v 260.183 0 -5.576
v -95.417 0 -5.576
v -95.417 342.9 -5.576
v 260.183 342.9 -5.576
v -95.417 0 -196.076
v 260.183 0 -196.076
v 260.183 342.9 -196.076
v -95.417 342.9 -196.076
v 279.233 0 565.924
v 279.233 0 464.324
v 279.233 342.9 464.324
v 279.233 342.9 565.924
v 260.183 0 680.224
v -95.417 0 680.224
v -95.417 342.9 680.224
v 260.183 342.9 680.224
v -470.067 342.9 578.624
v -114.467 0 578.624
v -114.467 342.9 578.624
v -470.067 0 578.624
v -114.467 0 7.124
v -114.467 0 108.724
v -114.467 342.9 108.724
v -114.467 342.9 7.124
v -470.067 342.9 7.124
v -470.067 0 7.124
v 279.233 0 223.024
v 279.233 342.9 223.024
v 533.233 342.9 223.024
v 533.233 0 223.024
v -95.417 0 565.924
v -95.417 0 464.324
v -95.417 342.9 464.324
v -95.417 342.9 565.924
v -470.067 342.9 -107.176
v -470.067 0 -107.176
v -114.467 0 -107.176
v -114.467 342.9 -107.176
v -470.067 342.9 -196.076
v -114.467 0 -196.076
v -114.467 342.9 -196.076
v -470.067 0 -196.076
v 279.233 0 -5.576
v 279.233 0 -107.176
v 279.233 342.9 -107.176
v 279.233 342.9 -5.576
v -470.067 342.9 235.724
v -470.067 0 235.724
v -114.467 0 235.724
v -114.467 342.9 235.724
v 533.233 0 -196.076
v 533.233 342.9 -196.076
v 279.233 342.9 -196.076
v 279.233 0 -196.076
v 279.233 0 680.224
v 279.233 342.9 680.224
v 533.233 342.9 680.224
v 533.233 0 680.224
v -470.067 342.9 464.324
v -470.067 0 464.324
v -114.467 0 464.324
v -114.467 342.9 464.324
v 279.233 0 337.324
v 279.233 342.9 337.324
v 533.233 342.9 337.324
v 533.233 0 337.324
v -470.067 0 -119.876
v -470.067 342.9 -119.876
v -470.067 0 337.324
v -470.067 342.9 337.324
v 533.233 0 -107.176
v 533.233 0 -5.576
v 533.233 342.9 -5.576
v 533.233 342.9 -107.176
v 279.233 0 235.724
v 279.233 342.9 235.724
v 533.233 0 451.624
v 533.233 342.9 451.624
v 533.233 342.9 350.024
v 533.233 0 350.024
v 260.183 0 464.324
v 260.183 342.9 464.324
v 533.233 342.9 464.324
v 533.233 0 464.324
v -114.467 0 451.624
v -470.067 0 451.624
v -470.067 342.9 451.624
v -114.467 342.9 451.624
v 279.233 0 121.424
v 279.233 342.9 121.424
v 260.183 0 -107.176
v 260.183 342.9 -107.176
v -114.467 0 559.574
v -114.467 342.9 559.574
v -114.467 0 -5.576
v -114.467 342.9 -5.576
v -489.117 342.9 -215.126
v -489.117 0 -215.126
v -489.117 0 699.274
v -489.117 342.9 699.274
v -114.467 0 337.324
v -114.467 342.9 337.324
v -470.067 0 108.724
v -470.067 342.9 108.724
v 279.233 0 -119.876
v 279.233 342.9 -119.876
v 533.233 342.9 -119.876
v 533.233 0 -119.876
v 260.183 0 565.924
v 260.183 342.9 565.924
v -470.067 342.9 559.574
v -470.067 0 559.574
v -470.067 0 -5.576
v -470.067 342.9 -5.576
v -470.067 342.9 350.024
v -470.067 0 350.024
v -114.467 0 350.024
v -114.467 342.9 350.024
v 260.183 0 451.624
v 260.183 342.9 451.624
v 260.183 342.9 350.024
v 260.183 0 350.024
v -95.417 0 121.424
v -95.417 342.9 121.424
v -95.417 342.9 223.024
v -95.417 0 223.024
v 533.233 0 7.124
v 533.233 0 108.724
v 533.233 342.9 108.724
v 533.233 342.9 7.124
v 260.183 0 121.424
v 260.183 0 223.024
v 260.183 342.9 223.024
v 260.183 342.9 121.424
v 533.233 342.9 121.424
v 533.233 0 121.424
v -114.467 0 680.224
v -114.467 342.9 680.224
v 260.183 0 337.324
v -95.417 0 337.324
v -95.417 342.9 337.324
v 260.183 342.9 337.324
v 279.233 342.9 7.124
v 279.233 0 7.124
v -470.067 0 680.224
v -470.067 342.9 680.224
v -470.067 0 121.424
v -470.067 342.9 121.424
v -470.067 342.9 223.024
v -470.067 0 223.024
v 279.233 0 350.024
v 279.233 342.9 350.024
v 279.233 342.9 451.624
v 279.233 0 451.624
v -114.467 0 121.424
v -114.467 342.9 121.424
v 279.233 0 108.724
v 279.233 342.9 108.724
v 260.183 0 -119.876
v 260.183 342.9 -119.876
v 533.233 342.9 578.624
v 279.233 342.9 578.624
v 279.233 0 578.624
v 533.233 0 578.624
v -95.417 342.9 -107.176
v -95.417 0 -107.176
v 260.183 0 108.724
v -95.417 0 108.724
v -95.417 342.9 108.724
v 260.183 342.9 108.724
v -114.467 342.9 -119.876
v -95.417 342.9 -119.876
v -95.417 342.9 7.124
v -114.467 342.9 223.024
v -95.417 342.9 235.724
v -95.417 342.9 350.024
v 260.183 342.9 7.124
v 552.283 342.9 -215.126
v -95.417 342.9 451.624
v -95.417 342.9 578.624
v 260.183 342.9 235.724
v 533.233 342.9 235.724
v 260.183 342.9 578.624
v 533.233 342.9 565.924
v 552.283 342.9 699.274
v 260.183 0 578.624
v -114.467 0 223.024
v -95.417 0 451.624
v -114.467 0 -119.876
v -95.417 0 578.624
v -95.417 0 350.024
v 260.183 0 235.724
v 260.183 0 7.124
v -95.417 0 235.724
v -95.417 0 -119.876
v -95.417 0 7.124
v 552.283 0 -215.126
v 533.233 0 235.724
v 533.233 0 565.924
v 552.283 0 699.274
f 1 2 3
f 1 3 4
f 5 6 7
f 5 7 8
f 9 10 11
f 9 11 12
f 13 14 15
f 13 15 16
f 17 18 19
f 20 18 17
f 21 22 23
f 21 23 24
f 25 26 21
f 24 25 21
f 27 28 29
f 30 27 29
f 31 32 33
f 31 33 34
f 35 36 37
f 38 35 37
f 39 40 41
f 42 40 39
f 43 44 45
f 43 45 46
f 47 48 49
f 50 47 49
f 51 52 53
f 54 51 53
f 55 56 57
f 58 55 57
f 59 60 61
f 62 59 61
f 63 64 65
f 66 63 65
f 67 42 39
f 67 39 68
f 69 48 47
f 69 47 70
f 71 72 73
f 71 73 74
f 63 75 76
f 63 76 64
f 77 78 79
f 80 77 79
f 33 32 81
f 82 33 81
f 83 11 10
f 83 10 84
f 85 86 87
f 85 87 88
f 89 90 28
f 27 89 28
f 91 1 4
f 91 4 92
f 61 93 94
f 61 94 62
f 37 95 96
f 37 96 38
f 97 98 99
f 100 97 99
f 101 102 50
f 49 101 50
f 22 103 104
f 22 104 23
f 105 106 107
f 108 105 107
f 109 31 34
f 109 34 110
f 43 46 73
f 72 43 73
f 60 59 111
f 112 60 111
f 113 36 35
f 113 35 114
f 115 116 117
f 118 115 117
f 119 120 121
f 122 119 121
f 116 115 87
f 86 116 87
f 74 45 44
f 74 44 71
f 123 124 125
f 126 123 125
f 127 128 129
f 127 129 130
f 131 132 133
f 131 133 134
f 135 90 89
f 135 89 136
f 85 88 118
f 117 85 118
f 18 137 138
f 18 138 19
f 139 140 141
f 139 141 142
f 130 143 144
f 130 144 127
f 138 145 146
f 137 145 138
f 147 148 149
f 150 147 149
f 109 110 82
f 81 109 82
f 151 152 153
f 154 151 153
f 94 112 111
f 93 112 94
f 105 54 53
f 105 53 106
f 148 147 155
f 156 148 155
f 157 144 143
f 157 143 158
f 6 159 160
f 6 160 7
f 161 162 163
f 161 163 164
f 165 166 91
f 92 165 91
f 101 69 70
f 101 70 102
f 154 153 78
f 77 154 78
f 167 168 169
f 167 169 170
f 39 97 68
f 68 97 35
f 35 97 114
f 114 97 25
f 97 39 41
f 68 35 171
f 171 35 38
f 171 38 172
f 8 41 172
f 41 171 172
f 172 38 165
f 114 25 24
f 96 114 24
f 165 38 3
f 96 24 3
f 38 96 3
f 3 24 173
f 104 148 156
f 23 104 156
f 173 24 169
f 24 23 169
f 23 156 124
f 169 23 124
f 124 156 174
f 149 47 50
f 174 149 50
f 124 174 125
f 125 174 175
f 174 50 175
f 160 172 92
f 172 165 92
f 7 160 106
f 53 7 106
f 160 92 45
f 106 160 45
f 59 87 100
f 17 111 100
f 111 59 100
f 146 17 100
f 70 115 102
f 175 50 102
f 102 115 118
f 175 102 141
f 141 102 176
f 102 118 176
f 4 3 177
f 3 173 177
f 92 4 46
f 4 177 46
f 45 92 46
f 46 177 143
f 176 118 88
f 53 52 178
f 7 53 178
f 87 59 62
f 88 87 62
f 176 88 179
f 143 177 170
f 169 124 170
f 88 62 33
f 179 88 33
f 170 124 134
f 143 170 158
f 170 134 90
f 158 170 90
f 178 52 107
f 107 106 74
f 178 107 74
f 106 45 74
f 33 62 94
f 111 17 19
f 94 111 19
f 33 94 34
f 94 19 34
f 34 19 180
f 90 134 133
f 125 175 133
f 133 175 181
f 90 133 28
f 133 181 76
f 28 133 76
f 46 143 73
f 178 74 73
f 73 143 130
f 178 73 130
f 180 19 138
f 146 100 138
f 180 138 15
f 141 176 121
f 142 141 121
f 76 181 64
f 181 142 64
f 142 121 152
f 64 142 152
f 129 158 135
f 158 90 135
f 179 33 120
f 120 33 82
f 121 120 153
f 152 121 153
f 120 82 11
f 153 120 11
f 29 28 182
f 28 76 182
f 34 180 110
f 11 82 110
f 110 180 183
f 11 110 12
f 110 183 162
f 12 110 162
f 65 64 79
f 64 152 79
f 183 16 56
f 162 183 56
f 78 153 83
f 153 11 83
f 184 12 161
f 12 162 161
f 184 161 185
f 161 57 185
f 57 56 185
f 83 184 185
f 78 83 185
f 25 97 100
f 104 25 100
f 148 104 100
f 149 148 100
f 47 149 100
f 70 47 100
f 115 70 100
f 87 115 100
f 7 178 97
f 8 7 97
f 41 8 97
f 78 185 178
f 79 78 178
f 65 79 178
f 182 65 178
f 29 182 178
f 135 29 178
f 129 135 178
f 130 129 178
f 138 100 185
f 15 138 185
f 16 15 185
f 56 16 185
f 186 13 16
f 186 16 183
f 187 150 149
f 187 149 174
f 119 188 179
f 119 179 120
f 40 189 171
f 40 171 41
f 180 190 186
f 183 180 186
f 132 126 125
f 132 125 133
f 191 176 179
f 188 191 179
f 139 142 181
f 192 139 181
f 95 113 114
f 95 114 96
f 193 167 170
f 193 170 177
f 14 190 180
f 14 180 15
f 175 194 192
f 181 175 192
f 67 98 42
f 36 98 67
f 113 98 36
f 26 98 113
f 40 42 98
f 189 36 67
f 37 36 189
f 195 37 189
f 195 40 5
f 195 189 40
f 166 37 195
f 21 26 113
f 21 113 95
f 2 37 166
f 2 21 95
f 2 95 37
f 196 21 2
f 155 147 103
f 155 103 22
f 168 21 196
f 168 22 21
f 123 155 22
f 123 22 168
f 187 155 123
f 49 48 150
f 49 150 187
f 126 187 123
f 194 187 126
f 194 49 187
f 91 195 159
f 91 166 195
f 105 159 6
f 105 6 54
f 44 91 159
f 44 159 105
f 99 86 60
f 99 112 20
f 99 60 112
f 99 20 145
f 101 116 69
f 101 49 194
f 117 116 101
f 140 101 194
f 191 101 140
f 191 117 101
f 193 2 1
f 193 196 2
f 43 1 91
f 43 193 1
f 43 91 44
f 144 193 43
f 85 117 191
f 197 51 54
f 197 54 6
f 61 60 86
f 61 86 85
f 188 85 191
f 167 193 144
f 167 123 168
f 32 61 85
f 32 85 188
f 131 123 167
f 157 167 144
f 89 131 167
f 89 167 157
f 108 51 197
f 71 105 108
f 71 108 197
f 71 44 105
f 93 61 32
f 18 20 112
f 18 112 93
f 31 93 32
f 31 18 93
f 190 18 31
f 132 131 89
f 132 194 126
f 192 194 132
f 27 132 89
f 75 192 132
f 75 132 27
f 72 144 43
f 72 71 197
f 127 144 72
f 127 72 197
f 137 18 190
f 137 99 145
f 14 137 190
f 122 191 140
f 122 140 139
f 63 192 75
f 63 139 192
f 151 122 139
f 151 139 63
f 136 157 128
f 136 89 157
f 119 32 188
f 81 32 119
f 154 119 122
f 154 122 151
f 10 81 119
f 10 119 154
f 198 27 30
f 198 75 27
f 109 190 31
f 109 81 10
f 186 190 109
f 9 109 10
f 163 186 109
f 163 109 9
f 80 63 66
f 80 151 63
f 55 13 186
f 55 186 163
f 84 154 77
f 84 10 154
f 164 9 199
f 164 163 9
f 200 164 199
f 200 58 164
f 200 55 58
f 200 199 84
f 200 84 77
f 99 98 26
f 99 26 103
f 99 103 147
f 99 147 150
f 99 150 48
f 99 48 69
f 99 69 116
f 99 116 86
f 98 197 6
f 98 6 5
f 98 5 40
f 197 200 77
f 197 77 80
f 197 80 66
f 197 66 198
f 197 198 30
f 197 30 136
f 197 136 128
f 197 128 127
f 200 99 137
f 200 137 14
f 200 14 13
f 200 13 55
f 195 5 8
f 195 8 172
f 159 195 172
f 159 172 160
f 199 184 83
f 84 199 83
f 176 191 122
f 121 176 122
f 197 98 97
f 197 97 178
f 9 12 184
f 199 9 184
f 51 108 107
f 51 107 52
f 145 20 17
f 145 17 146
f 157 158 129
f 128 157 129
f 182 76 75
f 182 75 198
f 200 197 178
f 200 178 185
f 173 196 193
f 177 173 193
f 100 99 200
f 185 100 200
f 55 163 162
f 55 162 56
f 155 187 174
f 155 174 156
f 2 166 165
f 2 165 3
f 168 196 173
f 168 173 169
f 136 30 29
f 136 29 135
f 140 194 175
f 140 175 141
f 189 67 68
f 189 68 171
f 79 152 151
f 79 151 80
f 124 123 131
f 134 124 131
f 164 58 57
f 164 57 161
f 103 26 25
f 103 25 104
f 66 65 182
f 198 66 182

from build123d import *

# Parameters (mm, degrees)
F0_W     = 1041.4
F0_H     = 914.4
F0_W_2   = 355.6
F0_H_2   = 12.7
F0_W_3   = 254
F1_DEPTH = 342.9


with BuildPart() as f1:
    # F0 (on Front) → F1 (new body)
    with BuildSketch(Plane.XZ):
        with Locations((31.582896, 242.074349)):
            Rectangle(F0_W, F0_H)
        Polygon((533.232896, -119.875651), (533.232896, -196.075651), (279.232896, -196.075651), (260.182896, -196.075651), (-95.417104, -196.075651), (-114.467104, -196.075651), (-470.067104, -196.075651), (-470.067104, -119.875651), (-470.067104, -107.175651), (-470.067104, -5.575651), (-470.067104, 7.124349), (-470.067104, 108.724349), (-470.067104, 121.424349), (-470.067104, 223.024349), (-470.067104, 235.724349), (-470.067104, 337.324349), (-470.067104, 350.024349), (-470.067104, 451.624349), (-470.067104, 464.324349), (-470.067104, 559.574349), (-470.067104, 565.924349), (-470.067104, 578.624349), (-470.067104, 680.224349), (-114.467104, 680.224349), (-95.417104, 680.224349), (260.182896, 680.224349), (279.232896, 680.224349), (533.232896, 680.224349), (533.232896, 578.624349), (533.232896, 565.924349), (533.232896, 464.324349), (533.232896, 451.624349), (533.232896, 350.024349), (533.232896, 337.324349), (533.232896, 235.724349), (533.232896, 223.024349), (533.232896, 121.424349), (533.232896, 108.724349), (533.232896, 7.124349), (533.232896, -5.575651), (533.232896, -107.175651), align=None, mode=Mode.SUBTRACT)
        Polygon((-470.067104, 559.574349), (-114.467104, 559.574349), (-114.467104, 565.924349), (-114.467104, 578.624349), (-470.067104, 578.624349), (-470.067104, 565.924349), align=None)
        Polygon((-114.467104, -196.075651), (-95.417104, -196.075651), (-95.417104, -119.875651), (-95.417104, -107.175651), (-95.417104, -5.575651), (-95.417104, 7.124349), (-95.417104, 108.724349), (-95.417104, 121.424349), (-95.417104, 223.024349), (-95.417104, 235.724349), (-95.417104, 337.324349), (-95.417104, 350.024349), (-95.417104, 451.624349), (-95.417104, 464.324349), (-95.417104, 565.924349), (-95.417104, 578.624349), (-95.417104, 680.224349), (-114.467104, 680.224349), (-114.467104, 578.624349), (-114.467104, 565.924349), (-114.467104, 559.574349), (-114.467104, 464.324349), (-114.467104, 451.624349), (-114.467104, 350.024349), (-114.467104, 337.324349), (-114.467104, 235.724349), (-114.467104, 223.024349), (-114.467104, 121.424349), (-114.467104, 108.724349), (-114.467104, 7.124349), (-114.467104, -5.575651), (-114.467104, -107.175651), (-114.467104, -119.875651), align=None)
        Polygon((260.182896, -196.075651), (279.232896, -196.075651), (279.232896, -119.875651), (279.232896, -107.175651), (279.232896, -5.575651), (279.232896, 7.124349), (279.232896, 108.724349), (279.232896, 121.424349), (279.232896, 223.024349), (279.232896, 235.724349), (279.232896, 337.324349), (279.232896, 350.024349), (279.232896, 451.624349), (279.232896, 464.324349), (279.232896, 565.924349), (279.232896, 578.624349), (279.232896, 680.224349), (260.182896, 680.224349), (260.182896, 578.624349), (260.182896, 565.924349), (260.182896, 464.324349), (260.182896, 451.624349), (260.182896, 350.024349), (260.182896, 337.324349), (260.182896, 235.724349), (260.182896, 223.024349), (260.182896, 121.424349), (260.182896, 108.724349), (260.182896, 7.124349), (260.182896, -5.575651), (260.182896, -107.175651), (260.182896, -119.875651), align=None)
        with Locations((82.382896, 572.274349)):
            Rectangle(F0_W_2, F0_H_2)
        with Locations((406.232896, 572.274349)):
            Rectangle(F0_W_3, F0_H_2)
        with Locations((406.232896, 457.974349)):
            Rectangle(F0_W_3, F0_H_2)
        with Locations((82.382896, 457.974349)):
            Rectangle(F0_W_2, F0_H_2)
        with Locations((-292.267104, 457.974349)):
            Rectangle(F0_W_2, F0_H_2)
        with Locations((-292.267104, 343.674349)):
            Rectangle(F0_W_2, F0_H_2)
        with Locations((-292.267104, 115.074349)):
            Rectangle(F0_W_2, F0_H_2)
        with Locations((-292.267104, 0.774349)):
            Rectangle(F0_W_2, F0_H_2)
        with Locations((-292.267104, -113.525651)):
            Rectangle(F0_W_2, F0_H_2)
        with Locations((82.382896, -113.525651)):
            Rectangle(F0_W_2, F0_H_2)
        with Locations((82.382896, 0.774349)):
            Rectangle(F0_W_2, F0_H_2)
        with Locations((82.382896, 115.074349)):
            Rectangle(F0_W_2, F0_H_2)
        with Locations((82.382896, 343.674349)):
            Rectangle(F0_W_2, F0_H_2)
        with Locations((82.382896, 229.374349)):
            Rectangle(F0_W_2, F0_H_2)
        with Locations((406.232896, 343.674349)):
            Rectangle(F0_W_3, F0_H_2)
        with Locations((406.232896, 229.374349)):
            Rectangle(F0_W_3, F0_H_2)
        with Locations((406.232896, 115.074349)):
            Rectangle(F0_W_3, F0_H_2)
        with Locations((406.232896, 0.774349)):
            Rectangle(F0_W_3, F0_H_2)
        with Locations((406.232896, -113.525651)):
            Rectangle(F0_W_3, F0_H_2)
        with Locations((-292.267104, 229.374349)):
            Rectangle(F0_W_2, F0_H_2)
    extrude(amount=-F1_DEPTH)


solid = f1.part
